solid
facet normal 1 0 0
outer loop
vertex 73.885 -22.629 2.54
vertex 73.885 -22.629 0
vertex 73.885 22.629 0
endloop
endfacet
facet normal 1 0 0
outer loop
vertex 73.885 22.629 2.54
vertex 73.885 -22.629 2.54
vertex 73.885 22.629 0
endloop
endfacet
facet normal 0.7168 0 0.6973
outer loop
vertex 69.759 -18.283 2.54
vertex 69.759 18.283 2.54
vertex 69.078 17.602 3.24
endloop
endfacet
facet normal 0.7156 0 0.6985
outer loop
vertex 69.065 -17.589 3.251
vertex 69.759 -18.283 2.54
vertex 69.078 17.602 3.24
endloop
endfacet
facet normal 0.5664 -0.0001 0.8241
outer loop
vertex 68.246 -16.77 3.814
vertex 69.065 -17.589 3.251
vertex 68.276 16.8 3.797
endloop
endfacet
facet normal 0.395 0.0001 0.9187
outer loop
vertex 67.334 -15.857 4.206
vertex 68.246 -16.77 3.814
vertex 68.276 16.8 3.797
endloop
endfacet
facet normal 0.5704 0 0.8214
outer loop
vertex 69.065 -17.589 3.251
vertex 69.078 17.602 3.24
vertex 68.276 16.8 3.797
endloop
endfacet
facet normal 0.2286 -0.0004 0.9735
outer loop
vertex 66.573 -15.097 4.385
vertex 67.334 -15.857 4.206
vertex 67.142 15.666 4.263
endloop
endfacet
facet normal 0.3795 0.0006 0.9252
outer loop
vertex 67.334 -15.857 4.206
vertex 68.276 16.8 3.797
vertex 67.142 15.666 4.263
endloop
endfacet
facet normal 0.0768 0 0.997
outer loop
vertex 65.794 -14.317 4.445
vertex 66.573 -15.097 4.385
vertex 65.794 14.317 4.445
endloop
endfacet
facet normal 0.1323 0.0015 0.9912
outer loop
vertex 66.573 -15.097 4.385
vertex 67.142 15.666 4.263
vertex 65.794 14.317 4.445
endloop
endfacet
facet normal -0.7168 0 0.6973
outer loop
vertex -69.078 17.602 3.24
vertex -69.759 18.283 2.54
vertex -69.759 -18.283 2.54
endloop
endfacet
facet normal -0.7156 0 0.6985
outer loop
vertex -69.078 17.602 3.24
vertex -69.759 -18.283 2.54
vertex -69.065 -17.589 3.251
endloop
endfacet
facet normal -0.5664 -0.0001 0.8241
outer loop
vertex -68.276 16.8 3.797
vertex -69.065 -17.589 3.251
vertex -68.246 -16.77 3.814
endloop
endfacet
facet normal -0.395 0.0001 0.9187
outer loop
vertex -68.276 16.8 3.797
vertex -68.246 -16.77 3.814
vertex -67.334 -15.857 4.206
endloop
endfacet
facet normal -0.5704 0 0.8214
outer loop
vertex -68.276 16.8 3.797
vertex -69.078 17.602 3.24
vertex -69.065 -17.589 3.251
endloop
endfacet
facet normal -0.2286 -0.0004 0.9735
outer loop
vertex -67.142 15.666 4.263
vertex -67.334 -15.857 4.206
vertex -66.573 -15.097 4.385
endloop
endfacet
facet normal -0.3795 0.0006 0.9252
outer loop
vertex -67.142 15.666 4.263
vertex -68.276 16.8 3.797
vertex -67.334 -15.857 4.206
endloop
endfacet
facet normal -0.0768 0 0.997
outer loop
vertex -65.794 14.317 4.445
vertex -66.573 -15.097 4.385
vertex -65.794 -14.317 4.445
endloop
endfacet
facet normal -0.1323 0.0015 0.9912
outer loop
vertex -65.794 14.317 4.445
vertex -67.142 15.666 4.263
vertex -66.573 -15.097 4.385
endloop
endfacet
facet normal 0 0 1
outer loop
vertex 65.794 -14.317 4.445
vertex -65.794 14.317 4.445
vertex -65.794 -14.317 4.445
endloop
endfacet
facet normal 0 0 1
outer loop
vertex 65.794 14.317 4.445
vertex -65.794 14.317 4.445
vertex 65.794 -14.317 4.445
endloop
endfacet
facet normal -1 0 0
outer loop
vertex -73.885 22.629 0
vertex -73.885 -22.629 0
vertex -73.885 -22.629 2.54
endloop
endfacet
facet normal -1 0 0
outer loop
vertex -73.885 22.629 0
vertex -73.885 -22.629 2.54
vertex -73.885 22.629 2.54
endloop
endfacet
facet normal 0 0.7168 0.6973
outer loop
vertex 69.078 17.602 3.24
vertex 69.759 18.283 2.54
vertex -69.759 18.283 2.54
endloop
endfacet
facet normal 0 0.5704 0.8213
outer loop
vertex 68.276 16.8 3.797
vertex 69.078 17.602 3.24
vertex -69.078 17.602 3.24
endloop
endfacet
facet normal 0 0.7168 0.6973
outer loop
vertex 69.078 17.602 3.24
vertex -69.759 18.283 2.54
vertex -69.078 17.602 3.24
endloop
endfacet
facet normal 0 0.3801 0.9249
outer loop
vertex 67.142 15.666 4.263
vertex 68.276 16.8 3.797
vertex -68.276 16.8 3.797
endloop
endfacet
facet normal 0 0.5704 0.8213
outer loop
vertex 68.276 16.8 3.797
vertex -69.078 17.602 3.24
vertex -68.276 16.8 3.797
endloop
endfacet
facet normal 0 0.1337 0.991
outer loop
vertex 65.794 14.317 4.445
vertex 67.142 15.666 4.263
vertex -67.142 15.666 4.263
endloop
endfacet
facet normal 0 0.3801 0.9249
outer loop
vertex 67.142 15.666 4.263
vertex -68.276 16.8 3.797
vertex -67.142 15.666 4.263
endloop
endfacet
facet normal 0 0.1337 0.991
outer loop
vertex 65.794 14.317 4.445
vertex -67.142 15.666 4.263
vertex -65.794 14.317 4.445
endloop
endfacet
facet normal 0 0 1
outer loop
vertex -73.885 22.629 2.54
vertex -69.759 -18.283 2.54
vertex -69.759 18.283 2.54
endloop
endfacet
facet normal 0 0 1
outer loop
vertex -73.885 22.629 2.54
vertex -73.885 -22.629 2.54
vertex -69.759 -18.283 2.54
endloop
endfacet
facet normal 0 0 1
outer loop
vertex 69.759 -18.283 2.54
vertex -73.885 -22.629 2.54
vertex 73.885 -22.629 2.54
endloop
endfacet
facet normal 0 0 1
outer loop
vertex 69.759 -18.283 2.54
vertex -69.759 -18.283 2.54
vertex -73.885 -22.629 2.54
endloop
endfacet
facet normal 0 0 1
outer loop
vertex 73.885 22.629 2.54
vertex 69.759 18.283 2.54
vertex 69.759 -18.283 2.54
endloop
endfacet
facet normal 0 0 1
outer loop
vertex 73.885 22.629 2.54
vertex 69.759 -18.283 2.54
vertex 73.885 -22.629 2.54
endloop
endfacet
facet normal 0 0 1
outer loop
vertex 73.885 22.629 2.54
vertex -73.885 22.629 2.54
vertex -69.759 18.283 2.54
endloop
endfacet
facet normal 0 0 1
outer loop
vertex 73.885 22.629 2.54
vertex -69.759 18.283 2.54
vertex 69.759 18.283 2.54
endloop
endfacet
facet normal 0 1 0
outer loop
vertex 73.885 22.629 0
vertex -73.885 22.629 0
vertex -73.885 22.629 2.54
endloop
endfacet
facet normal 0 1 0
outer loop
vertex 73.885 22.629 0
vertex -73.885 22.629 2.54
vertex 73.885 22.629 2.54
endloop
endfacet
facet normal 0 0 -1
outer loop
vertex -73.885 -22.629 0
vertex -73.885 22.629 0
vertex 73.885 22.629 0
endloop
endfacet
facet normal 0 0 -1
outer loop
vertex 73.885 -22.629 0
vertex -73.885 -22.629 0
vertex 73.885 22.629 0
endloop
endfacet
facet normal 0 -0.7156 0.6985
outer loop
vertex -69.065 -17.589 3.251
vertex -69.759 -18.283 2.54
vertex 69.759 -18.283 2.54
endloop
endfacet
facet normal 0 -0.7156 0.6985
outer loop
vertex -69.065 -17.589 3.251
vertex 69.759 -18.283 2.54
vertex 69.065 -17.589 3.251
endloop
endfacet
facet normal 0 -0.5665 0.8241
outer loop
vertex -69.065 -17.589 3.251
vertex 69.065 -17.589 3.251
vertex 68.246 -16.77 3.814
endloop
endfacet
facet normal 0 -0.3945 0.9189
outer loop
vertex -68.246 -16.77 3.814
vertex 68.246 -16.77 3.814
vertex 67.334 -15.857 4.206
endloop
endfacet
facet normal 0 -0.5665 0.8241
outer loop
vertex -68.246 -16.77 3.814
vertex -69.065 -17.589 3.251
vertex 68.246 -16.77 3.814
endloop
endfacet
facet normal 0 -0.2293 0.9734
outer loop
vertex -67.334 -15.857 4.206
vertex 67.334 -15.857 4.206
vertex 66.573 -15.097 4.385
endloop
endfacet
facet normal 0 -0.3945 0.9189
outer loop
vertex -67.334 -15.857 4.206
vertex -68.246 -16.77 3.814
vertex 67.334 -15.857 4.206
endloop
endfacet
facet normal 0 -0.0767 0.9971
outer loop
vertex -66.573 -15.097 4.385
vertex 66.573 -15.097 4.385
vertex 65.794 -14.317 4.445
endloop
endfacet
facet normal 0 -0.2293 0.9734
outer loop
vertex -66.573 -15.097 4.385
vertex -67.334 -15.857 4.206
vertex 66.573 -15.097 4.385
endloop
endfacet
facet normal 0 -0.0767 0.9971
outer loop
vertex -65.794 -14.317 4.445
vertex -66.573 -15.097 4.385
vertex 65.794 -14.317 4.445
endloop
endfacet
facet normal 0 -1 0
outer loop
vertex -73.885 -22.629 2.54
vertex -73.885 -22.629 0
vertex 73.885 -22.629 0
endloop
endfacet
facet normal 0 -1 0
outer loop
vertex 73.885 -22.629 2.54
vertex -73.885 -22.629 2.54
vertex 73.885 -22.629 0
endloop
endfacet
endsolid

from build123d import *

# Parameters (mm, degrees)
F0_W        = 147.7690637112
F0_H        = 45.2575087547
F1_DEPTH    = 2.54
F2_W        = 139.5183503628
F2_H        = 36.5658290684
F3_DEPTH    = 1.905
F4_T1_DEPTH = 159.3462190077
F4_T3_DEPTH = 56.3936977133


# Not quite as in the source:
# - a fillet or chamfer that OpenCascade refuses, or shapes differently, is made with other operations: its cross-section is extruded or revolved along the edge and cut away or added


with BuildPart() as f1:
    # F0 (on Top) → F1 (new body)
    with BuildSketch(Plane.XY):
        Rectangle(F0_W, F0_H)
    extrude(amount=F1_DEPTH)

    # F2 (on face) → F3 (join)
    with BuildSketch(Plane.XY.offset(2.54)):
        Rectangle(F2_W, F2_H)
    extrude(amount=F3_DEPTH)

    # F4: fillet of radius 5.08 on 4 edges, made by hand

    # F4_s2 → F4_t1 (cut)
    with BuildSketch(Plane.YZ.offset(-79.6731095038)):
        with BuildLine():
            ThreePointArc((-18.2829145342, 2.54), (-16.5170453308, 3.9440501198), (-14.3173408052, 4.445))
            Line((-14.3173408052, 4.445), (-18.2829145342, 4.445))
            Line((-18.2829145342, 4.445), (-18.2829145342, 2.54))
        make_face()
        with BuildLine():
            ThreePointArc((18.2829145342, 2.54), (16.5170453308, 3.9440501198), (14.3173408052, 4.445))
            Line((14.3173408052, 4.445), (18.2829145342, 4.445))
            Line((18.2829145342, 4.445), (18.2829145342, 2.54))
        make_face()
    extrude(amount=F4_T1_DEPTH, mode=Mode.SUBTRACT)

    # F4_s4 → F4_t3 (cut)
    with BuildSketch(Plane.XZ.offset(-28.1968488567)):
        with BuildLine():
            ThreePointArc((-69.7591751814, 2.54), (-67.993305978, 3.9440501198), (-65.7936014524, 4.445))
            Line((-65.7936014524, 4.445), (-69.7591751814, 4.445))
            Line((-69.7591751814, 4.445), (-69.7591751814, 2.54))
        make_face()
        with BuildLine():
            ThreePointArc((69.7591751814, 2.54), (67.993305978, 3.9440501198), (65.7936014524, 4.445))
            Line((65.7936014524, 4.445), (69.7591751814, 4.445))
            Line((69.7591751814, 4.445), (69.7591751814, 2.54))
        make_face()
    extrude(amount=F4_T3_DEPTH, mode=Mode.SUBTRACT)


solid = f1.part
